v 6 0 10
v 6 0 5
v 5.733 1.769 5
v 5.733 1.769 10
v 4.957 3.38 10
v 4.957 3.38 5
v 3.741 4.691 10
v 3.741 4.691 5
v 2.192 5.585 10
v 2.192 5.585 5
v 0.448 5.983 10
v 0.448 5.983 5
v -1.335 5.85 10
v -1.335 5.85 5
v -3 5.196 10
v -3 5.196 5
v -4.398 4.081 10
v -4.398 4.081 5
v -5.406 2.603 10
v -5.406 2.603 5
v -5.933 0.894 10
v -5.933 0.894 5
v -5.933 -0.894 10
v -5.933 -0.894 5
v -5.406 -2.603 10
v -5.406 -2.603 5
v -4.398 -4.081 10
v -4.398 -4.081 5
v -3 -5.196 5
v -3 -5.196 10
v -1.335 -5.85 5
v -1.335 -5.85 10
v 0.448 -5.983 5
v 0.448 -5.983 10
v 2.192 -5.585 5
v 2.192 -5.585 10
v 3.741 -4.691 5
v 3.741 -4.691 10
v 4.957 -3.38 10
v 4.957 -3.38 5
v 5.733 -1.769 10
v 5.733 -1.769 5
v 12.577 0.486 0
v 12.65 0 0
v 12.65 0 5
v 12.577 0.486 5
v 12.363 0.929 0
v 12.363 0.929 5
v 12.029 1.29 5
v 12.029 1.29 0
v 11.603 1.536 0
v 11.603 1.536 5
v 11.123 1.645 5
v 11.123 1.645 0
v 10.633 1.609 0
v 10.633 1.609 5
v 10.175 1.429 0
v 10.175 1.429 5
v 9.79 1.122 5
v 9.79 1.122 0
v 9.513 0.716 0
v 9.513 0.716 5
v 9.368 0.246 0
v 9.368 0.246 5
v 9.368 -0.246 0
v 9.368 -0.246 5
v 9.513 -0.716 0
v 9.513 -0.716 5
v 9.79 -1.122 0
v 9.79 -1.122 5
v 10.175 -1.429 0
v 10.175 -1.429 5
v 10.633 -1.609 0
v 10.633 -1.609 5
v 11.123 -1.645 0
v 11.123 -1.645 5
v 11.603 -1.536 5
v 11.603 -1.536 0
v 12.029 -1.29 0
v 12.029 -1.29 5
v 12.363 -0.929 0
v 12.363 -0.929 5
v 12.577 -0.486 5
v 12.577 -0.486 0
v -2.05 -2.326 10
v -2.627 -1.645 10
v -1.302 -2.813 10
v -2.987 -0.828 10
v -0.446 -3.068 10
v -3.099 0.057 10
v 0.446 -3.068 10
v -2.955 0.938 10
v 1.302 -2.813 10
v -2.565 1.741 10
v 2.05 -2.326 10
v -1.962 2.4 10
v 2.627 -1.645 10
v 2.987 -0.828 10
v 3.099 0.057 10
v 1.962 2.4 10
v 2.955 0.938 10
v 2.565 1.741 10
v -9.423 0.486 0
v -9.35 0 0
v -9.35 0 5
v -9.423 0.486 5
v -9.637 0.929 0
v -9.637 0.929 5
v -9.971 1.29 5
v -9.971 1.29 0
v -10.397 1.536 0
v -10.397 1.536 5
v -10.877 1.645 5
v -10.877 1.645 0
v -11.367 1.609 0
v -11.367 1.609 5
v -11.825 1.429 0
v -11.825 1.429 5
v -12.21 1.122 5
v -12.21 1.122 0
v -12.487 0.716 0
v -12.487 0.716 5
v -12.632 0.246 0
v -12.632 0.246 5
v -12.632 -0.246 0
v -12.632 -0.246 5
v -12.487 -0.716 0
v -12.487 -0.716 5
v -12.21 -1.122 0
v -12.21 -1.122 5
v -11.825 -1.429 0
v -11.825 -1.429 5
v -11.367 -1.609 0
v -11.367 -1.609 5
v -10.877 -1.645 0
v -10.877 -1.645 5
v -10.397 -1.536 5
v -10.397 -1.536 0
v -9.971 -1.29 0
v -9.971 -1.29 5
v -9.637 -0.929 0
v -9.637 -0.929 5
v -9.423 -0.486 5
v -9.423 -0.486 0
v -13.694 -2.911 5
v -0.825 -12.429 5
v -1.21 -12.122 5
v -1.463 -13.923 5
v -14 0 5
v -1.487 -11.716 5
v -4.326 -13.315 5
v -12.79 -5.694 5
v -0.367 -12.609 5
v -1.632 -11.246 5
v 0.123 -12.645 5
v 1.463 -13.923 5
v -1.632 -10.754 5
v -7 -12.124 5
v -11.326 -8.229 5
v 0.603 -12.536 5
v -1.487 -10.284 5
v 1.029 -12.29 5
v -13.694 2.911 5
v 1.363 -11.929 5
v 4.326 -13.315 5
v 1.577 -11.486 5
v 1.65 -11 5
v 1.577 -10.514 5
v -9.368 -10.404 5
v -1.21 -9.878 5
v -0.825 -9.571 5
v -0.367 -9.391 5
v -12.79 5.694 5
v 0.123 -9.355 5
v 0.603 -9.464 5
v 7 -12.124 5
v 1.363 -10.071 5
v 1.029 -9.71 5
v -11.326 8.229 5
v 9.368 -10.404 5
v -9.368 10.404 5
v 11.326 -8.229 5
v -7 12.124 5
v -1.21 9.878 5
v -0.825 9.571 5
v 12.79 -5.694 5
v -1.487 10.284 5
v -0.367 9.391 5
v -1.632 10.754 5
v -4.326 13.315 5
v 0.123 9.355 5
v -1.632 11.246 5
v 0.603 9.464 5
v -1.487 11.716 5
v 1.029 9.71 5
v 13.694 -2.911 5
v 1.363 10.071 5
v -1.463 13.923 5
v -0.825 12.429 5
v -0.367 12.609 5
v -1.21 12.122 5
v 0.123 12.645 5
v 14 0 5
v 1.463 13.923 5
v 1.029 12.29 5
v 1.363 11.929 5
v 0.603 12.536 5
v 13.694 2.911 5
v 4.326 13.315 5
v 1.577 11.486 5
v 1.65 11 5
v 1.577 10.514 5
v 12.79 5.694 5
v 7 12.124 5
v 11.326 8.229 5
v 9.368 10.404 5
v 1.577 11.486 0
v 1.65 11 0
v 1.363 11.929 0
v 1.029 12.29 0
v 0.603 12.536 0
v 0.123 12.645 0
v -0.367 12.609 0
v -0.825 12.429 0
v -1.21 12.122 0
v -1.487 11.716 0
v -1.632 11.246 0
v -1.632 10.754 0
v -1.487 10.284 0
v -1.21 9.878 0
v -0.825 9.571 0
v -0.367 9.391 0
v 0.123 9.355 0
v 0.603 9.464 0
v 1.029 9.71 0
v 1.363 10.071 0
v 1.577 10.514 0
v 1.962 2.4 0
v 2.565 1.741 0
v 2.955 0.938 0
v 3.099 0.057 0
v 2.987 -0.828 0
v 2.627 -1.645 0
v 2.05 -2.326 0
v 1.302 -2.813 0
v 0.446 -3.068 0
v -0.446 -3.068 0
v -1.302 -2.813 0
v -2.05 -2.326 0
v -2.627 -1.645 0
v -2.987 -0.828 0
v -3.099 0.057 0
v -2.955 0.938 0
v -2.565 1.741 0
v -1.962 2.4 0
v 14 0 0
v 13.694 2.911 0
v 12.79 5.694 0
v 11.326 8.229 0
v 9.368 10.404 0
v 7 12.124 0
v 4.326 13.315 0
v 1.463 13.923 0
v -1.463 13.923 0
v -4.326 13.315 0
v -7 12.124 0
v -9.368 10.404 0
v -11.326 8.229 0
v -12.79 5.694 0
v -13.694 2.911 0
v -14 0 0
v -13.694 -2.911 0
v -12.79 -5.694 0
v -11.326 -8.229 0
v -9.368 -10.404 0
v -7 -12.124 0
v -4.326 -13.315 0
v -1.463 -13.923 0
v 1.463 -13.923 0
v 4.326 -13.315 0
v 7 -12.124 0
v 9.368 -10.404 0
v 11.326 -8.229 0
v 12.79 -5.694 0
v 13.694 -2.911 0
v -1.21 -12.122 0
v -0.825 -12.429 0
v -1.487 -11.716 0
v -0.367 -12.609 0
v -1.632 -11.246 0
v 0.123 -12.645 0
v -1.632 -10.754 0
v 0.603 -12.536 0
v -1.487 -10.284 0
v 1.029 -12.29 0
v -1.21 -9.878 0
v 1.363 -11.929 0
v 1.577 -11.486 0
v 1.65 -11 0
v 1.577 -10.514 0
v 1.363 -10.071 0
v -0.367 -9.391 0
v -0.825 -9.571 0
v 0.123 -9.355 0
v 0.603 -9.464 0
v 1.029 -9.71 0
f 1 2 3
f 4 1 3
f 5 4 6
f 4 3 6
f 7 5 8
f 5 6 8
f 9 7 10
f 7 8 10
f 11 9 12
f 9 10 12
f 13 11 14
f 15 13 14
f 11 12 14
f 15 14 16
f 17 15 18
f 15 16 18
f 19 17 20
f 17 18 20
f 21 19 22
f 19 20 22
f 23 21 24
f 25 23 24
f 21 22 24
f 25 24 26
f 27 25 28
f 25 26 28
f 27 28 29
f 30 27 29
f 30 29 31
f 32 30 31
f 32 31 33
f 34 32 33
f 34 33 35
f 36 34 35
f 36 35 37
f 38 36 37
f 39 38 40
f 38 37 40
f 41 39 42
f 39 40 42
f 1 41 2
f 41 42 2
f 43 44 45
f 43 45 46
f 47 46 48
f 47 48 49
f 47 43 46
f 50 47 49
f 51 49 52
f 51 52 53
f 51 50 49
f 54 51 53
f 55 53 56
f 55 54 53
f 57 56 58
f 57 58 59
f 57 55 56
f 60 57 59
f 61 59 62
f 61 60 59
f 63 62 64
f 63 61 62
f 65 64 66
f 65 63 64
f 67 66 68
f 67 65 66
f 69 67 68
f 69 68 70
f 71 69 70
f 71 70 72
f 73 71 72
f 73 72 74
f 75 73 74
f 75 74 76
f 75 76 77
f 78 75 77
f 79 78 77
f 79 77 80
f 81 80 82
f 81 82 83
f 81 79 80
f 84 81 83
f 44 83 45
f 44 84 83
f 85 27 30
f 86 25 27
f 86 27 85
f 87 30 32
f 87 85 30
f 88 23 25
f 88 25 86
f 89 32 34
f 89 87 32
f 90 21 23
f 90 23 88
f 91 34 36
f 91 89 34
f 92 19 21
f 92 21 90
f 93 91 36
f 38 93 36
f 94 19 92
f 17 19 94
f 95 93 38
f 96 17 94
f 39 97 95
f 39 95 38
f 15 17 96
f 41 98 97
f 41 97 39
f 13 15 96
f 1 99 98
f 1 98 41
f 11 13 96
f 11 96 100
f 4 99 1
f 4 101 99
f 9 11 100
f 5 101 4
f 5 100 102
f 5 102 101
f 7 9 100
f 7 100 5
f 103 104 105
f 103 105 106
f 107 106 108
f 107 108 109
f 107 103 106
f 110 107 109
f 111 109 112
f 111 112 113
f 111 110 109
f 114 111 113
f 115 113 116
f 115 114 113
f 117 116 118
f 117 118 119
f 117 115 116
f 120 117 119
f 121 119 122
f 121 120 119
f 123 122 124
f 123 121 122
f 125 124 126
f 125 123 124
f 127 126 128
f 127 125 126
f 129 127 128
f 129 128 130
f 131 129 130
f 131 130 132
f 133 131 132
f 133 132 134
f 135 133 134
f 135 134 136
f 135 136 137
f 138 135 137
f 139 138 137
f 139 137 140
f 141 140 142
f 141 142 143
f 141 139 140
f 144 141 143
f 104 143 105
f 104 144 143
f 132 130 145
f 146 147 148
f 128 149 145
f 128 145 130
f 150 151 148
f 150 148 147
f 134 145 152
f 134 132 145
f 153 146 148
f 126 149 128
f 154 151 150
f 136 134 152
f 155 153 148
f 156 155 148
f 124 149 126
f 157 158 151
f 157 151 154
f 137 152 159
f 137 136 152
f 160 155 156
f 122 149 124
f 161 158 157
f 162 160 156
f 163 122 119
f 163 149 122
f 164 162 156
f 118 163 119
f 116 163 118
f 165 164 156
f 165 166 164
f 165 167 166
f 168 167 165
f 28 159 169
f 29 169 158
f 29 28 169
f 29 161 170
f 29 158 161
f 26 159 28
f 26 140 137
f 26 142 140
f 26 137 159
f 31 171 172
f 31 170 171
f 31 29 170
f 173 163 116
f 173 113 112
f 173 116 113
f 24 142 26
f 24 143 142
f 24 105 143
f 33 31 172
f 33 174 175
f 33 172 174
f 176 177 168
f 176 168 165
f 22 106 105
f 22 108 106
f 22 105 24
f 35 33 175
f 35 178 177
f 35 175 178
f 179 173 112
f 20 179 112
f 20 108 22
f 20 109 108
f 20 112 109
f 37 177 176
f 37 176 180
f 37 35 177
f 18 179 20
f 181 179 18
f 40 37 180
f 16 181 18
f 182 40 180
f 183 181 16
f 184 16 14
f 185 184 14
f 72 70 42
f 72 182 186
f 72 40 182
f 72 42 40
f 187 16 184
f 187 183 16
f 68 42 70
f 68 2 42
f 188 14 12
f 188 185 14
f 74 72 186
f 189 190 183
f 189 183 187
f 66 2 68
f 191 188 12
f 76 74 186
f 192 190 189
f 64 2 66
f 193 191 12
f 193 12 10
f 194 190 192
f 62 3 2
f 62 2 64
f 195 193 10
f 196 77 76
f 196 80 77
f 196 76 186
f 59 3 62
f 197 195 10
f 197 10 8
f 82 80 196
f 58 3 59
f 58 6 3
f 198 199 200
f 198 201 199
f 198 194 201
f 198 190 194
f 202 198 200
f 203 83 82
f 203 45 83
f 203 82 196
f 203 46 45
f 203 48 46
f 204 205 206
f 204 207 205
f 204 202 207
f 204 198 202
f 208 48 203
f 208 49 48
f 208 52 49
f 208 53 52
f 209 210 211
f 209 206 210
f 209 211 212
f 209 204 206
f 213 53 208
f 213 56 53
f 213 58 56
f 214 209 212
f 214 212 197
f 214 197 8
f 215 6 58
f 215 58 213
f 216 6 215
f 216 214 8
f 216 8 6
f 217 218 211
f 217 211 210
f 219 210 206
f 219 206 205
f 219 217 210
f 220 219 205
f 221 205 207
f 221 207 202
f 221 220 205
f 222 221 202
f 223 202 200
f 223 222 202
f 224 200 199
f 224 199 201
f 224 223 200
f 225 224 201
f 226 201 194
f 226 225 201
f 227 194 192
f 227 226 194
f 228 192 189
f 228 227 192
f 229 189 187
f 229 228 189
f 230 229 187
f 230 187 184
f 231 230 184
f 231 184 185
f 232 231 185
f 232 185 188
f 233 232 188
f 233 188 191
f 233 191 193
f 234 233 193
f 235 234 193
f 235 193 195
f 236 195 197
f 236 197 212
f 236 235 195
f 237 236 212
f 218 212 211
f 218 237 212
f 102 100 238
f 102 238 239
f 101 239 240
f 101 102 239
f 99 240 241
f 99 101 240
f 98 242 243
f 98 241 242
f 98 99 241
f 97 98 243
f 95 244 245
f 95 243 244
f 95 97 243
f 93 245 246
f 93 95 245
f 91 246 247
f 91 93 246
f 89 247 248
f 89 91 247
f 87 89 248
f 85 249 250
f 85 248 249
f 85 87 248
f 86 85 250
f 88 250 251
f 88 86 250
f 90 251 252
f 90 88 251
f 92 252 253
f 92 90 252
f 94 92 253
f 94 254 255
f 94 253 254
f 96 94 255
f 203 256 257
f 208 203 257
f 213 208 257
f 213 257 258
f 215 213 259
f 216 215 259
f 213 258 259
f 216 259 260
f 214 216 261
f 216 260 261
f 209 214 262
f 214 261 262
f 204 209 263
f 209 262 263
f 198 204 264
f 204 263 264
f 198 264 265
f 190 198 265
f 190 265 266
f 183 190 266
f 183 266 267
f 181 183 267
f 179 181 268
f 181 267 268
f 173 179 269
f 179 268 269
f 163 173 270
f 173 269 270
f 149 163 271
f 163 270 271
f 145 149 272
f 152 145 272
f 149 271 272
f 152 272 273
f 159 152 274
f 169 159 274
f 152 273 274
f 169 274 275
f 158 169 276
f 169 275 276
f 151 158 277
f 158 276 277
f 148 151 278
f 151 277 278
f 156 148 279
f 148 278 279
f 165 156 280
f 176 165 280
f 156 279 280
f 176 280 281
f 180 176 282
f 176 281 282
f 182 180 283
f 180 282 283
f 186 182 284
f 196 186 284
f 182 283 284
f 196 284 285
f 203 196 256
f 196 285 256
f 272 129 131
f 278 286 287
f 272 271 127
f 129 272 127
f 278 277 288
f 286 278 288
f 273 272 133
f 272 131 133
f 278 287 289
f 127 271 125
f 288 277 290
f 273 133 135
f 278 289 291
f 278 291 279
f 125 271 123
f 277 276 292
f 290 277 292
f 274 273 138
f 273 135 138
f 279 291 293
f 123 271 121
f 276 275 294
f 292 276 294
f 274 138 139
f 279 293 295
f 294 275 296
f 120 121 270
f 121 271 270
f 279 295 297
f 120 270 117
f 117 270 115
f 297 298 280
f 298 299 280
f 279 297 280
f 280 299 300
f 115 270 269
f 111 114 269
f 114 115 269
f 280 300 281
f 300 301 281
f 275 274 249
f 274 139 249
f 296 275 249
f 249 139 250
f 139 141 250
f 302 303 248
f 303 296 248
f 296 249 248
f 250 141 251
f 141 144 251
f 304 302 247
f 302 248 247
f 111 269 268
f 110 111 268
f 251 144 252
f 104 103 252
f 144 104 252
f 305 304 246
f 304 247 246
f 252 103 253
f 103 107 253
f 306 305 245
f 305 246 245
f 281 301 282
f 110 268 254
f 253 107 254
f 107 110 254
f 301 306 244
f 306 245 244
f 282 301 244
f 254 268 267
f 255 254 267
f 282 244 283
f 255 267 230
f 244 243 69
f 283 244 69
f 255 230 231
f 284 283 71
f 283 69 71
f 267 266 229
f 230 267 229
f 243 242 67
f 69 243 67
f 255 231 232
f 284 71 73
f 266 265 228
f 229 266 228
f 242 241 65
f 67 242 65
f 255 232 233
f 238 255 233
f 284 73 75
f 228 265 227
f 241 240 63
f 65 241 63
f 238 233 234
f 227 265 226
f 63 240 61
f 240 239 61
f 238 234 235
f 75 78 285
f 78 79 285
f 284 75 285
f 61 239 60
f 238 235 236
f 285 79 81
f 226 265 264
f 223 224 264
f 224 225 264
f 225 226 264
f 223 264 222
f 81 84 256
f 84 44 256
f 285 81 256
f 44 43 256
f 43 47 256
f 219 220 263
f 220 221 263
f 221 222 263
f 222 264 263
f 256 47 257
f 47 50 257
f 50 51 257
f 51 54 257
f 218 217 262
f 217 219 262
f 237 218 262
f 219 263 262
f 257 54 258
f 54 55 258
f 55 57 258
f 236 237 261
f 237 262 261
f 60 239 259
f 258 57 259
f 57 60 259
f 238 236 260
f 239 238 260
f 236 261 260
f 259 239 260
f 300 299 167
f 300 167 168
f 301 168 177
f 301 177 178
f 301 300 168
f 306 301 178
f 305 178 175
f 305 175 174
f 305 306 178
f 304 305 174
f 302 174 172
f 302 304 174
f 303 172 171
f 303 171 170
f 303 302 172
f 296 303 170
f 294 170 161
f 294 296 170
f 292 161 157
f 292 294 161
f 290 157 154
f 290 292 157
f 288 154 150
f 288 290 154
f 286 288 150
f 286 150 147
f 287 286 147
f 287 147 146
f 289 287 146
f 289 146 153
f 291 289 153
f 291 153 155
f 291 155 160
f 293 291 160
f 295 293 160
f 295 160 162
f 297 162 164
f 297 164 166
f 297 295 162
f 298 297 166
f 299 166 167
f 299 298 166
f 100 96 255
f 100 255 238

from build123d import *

# Parameters (mm, degrees)
SKETCH1_R           = 14
SKETCH1_R_2         = 1.65
BOSS_EXTRUDE1_DEPTH = 5
SKETCH2_R           = 6
BOSS_EXTRUDE2_DEPTH = 5
CUT_EXTRUDE1_DEPTH  = 11


with BuildPart() as part:
    # Sketch1 → Boss-Extrude1 (new body)
    with BuildSketch(Plane.XY):
        Circle(SKETCH1_R)
        with Locations((0, 11)):
            Circle(SKETCH1_R_2, mode=Mode.SUBTRACT)
        with Locations((11, 0)):
            Circle(SKETCH1_R_2, mode=Mode.SUBTRACT)
        with Locations((0, -11)):
            Circle(SKETCH1_R_2, mode=Mode.SUBTRACT)
        with Locations((-11, 0)):
            Circle(SKETCH1_R_2, mode=Mode.SUBTRACT)
    extrude(amount=BOSS_EXTRUDE1_DEPTH)

    # Sketch2 → Boss-Extrude2 (add)
    with BuildSketch(Plane.XY.offset(5)):
        Circle(SKETCH2_R)
    extrude(amount=BOSS_EXTRUDE2_DEPTH)

    # Sketch3 → Cut-Extrude1 (cut, through all)
    with BuildSketch(Plane.XY.offset(10)):
        with BuildLine():
            Line((-1.962141687, 2.4), (1.962141687, 2.4))
            ThreePointArc((1.962141687, 2.4), (0, -3.1), (-1.962141687, 2.4))
        make_face()
    extrude(amount=-CUT_EXTRUDE1_DEPTH, mode=Mode.SUBTRACT)


solid = part.part
